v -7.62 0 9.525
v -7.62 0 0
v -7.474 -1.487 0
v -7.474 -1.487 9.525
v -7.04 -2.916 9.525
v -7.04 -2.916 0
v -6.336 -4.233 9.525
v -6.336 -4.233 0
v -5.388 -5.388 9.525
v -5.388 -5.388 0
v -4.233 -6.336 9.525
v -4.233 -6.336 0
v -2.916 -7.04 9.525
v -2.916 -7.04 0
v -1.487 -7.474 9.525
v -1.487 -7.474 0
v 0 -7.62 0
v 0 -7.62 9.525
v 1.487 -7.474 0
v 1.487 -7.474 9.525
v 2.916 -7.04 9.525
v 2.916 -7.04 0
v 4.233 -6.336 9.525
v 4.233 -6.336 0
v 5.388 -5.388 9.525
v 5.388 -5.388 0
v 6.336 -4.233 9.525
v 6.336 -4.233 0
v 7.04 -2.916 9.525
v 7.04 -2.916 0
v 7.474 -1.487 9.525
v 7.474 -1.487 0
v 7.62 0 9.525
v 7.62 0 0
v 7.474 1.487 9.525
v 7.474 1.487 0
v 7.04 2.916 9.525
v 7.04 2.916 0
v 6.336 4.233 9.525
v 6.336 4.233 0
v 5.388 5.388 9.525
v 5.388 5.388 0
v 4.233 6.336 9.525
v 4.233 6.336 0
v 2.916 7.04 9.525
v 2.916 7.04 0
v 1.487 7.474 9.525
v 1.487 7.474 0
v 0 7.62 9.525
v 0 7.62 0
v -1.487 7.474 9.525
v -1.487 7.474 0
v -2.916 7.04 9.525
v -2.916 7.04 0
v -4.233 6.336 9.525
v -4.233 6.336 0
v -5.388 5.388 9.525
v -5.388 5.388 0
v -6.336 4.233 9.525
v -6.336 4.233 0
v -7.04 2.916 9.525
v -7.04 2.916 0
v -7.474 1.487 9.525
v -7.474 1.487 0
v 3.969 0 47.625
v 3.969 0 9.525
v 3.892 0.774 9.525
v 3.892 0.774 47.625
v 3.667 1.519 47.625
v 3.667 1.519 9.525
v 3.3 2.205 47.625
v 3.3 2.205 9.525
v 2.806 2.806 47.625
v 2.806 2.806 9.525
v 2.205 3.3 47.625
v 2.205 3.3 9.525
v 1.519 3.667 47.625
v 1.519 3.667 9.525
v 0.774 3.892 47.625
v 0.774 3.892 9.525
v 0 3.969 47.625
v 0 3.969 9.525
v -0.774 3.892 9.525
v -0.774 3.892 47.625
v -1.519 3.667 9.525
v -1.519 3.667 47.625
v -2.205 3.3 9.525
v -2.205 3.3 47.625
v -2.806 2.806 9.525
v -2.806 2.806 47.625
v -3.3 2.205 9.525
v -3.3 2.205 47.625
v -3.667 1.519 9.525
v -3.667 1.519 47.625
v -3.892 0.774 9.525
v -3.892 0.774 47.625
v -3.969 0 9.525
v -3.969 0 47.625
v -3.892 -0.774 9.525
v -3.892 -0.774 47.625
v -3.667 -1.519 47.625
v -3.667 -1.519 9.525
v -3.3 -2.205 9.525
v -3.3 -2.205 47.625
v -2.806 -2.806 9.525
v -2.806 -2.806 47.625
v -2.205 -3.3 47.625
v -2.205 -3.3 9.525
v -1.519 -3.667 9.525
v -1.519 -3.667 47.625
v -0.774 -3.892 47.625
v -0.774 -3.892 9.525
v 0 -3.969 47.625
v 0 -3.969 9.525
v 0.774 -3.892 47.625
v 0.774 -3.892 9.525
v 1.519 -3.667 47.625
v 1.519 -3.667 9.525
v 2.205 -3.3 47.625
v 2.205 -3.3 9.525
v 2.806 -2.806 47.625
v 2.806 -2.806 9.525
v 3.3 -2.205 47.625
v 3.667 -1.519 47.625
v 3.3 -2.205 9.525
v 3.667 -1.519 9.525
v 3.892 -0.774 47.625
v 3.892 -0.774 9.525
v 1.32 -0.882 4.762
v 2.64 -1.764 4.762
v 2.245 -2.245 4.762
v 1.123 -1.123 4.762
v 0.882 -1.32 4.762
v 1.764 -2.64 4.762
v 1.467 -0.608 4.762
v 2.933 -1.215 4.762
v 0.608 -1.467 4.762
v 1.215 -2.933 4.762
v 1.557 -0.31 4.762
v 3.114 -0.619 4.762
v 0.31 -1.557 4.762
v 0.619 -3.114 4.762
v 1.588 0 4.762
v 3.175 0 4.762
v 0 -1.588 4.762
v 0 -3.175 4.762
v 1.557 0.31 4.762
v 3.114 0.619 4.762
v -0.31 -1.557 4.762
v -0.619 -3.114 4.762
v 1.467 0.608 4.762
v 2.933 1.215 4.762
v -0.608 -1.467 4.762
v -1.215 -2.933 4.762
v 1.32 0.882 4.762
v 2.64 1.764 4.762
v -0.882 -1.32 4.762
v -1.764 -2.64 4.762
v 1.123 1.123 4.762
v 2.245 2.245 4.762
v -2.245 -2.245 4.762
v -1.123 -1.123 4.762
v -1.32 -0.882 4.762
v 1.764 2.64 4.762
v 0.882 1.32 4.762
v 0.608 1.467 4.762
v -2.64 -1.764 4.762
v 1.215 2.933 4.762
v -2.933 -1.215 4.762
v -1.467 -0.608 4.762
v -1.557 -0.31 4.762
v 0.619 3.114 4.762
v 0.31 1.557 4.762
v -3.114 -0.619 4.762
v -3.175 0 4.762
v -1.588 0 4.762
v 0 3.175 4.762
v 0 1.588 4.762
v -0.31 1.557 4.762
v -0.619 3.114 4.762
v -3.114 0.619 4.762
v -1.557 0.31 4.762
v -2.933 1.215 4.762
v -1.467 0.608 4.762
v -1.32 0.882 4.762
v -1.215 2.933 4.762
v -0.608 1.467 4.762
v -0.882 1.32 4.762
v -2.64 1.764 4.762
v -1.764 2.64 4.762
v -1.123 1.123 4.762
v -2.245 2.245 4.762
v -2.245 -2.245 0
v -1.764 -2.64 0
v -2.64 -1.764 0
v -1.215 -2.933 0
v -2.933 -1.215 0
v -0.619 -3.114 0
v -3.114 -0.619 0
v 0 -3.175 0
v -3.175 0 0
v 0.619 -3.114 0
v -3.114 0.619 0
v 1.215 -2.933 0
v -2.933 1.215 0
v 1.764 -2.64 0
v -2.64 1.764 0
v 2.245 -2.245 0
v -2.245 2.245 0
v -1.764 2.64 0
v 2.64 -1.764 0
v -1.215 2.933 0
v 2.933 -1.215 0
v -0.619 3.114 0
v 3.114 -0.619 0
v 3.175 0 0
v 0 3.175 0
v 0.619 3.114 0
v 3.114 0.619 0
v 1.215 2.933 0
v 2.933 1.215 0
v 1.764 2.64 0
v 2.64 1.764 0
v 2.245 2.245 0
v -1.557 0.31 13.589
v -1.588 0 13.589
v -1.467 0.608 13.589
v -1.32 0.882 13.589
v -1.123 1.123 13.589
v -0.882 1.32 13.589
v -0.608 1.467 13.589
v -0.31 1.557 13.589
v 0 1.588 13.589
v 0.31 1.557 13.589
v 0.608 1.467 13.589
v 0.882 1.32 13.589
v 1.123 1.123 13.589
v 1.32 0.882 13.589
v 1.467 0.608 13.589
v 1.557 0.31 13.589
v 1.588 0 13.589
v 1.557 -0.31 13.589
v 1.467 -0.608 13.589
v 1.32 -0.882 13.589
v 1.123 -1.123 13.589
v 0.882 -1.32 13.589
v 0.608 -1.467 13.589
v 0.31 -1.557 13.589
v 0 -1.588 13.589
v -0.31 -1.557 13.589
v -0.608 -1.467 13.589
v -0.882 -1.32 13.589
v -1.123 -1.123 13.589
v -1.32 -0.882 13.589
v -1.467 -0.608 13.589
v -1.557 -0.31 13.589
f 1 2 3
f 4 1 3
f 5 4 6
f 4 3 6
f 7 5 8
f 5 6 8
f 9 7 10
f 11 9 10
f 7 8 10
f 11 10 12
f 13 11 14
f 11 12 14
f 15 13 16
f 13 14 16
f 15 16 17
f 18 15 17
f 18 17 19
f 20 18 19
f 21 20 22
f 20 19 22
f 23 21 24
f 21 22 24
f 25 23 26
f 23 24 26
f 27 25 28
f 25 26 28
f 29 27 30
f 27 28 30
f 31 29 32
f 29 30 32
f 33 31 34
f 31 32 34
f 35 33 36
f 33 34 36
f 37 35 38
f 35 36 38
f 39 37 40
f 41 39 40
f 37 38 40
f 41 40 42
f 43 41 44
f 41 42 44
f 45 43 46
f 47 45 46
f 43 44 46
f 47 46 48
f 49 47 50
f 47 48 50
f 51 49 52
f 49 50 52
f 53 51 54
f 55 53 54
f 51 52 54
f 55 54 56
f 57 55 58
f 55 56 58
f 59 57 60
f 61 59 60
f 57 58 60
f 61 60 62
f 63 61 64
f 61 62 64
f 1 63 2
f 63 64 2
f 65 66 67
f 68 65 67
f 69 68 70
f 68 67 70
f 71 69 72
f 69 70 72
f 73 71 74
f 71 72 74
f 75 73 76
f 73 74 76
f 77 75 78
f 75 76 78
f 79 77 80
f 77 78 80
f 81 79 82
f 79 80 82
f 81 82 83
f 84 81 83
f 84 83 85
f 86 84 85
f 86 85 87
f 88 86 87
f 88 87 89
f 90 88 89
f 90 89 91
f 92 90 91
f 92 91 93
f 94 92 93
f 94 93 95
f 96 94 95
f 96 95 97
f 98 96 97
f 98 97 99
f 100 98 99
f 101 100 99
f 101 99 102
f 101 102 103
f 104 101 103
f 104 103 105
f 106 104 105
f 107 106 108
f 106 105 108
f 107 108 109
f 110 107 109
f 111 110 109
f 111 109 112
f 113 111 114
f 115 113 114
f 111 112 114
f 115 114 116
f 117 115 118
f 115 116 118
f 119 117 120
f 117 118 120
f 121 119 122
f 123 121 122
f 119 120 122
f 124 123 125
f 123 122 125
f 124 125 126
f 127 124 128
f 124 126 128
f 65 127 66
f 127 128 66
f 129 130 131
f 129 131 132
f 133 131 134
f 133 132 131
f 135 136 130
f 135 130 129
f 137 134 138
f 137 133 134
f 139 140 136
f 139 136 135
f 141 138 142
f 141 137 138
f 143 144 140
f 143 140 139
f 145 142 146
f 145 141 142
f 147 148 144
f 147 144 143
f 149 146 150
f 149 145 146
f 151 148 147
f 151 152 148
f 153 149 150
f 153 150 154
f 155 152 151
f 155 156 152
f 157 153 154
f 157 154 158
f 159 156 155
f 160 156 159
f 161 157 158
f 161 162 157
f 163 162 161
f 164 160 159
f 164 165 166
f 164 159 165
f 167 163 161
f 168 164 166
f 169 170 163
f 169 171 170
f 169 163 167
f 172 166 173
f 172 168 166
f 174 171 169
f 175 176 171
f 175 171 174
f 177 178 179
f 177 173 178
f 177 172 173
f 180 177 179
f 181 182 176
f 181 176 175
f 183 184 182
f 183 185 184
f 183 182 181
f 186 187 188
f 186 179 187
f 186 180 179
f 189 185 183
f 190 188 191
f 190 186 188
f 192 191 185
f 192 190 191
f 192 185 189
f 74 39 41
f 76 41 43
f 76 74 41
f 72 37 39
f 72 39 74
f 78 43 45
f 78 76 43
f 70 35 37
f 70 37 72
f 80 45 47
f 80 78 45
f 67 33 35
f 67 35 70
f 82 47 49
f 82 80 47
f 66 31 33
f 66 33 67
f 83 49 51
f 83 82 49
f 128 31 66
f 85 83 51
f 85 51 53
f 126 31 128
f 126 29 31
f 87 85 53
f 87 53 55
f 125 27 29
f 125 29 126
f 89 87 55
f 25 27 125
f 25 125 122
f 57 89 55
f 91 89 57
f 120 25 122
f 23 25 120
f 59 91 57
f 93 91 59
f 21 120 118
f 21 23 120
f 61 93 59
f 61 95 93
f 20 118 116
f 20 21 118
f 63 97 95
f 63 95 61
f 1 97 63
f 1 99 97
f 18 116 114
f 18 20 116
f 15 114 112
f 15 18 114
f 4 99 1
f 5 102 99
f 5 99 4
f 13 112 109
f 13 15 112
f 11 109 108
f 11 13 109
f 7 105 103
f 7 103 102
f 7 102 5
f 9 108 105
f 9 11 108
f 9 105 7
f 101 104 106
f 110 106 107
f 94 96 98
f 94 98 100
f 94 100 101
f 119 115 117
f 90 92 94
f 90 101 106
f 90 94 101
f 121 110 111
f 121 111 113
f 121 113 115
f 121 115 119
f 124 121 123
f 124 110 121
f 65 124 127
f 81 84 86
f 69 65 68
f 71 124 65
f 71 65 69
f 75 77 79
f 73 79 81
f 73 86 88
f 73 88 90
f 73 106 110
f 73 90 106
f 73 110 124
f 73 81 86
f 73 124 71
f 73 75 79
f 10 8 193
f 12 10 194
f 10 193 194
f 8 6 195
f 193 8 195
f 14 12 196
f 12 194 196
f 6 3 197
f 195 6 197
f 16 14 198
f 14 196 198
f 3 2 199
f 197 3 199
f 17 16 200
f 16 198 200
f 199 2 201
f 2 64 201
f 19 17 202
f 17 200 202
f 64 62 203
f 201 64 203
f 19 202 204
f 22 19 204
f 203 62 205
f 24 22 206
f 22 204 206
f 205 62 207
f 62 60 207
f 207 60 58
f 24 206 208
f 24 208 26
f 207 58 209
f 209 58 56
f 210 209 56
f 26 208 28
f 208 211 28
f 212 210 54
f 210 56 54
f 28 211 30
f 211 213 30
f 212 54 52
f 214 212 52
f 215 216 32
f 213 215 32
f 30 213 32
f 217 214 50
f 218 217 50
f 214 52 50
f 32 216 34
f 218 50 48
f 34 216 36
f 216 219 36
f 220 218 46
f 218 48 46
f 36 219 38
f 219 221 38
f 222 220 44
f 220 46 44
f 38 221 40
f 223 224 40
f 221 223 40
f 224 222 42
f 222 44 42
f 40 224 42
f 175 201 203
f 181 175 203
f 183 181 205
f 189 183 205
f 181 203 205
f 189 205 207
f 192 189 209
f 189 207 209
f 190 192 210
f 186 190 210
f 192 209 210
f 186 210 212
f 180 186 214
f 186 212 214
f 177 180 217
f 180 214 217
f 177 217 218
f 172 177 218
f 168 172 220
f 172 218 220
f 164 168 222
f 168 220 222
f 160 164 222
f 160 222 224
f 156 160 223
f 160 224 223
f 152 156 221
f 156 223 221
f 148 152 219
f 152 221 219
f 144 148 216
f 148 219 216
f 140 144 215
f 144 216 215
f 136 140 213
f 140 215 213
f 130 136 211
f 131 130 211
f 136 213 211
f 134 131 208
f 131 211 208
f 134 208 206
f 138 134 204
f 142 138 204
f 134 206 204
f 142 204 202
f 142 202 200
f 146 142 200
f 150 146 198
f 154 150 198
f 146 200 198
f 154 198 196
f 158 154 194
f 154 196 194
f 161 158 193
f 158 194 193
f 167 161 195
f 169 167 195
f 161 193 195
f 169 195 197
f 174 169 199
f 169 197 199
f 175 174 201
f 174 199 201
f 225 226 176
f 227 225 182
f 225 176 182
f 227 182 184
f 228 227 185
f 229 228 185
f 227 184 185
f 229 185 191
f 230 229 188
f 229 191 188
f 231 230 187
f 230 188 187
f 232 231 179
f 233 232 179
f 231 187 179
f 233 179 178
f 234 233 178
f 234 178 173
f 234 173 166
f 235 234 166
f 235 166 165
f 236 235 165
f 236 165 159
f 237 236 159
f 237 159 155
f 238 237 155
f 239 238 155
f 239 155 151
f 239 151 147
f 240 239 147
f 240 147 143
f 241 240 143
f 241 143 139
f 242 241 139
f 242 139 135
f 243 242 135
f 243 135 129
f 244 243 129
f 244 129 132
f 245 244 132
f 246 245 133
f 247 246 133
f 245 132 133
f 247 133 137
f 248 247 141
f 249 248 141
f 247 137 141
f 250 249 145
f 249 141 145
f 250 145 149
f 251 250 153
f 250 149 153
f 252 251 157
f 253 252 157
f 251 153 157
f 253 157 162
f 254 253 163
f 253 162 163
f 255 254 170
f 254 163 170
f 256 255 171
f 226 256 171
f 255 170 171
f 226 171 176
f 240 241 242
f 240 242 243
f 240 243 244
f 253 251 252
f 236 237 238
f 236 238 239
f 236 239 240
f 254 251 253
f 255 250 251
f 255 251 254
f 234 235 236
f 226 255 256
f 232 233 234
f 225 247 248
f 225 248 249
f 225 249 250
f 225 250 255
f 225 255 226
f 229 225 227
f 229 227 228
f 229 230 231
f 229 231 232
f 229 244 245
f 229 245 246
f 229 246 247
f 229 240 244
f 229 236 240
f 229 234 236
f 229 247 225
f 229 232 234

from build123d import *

# Parameters (mm, degrees)
SKETCH1_R               = 7.62
TOP_HEAD_DEPTH          = 9.525
LOWER_START             = 6.35
SKETCH1_4_R             = 3.96875
LOWER_PIN_DEPTH         = 41.275
SKETCH2_R               = 3.175
O_RING_OPENING_DEPTH    = 4.7625
SKETCH2_3_R             = 1.5875
POT_SHAFT_OPENING_DEPTH = 13.589


with BuildPart() as part:
    # Sketch1 → Top Head (new body)
    with BuildSketch(Plane.XY):
        Circle(SKETCH1_R)
    extrude(amount=TOP_HEAD_DEPTH)

    # Sketch1<4> → Lower Pin (add)
    with BuildSketch(Plane.XY.offset(LOWER_START)):
        Circle(SKETCH1_4_R)
    extrude(amount=LOWER_PIN_DEPTH)

    # Sketch2 → O-Ring Opening (cut)
    with BuildSketch(Plane(origin=(0, 0, 0), x_dir=(-1, 0, 0), z_dir=(0, 0, -1))):
        Circle(SKETCH2_R)
    extrude(amount=-O_RING_OPENING_DEPTH, mode=Mode.SUBTRACT)

    # Sketch2<3> → POT Shaft Opening (cut)
    with BuildSketch(Plane(origin=(0, 0, 0), x_dir=(-1, 0, 0), z_dir=(0, 0, -1))):
        Circle(SKETCH2_3_R)
    extrude(amount=-POT_SHAFT_OPENING_DEPTH, mode=Mode.SUBTRACT)


solid = part.part
